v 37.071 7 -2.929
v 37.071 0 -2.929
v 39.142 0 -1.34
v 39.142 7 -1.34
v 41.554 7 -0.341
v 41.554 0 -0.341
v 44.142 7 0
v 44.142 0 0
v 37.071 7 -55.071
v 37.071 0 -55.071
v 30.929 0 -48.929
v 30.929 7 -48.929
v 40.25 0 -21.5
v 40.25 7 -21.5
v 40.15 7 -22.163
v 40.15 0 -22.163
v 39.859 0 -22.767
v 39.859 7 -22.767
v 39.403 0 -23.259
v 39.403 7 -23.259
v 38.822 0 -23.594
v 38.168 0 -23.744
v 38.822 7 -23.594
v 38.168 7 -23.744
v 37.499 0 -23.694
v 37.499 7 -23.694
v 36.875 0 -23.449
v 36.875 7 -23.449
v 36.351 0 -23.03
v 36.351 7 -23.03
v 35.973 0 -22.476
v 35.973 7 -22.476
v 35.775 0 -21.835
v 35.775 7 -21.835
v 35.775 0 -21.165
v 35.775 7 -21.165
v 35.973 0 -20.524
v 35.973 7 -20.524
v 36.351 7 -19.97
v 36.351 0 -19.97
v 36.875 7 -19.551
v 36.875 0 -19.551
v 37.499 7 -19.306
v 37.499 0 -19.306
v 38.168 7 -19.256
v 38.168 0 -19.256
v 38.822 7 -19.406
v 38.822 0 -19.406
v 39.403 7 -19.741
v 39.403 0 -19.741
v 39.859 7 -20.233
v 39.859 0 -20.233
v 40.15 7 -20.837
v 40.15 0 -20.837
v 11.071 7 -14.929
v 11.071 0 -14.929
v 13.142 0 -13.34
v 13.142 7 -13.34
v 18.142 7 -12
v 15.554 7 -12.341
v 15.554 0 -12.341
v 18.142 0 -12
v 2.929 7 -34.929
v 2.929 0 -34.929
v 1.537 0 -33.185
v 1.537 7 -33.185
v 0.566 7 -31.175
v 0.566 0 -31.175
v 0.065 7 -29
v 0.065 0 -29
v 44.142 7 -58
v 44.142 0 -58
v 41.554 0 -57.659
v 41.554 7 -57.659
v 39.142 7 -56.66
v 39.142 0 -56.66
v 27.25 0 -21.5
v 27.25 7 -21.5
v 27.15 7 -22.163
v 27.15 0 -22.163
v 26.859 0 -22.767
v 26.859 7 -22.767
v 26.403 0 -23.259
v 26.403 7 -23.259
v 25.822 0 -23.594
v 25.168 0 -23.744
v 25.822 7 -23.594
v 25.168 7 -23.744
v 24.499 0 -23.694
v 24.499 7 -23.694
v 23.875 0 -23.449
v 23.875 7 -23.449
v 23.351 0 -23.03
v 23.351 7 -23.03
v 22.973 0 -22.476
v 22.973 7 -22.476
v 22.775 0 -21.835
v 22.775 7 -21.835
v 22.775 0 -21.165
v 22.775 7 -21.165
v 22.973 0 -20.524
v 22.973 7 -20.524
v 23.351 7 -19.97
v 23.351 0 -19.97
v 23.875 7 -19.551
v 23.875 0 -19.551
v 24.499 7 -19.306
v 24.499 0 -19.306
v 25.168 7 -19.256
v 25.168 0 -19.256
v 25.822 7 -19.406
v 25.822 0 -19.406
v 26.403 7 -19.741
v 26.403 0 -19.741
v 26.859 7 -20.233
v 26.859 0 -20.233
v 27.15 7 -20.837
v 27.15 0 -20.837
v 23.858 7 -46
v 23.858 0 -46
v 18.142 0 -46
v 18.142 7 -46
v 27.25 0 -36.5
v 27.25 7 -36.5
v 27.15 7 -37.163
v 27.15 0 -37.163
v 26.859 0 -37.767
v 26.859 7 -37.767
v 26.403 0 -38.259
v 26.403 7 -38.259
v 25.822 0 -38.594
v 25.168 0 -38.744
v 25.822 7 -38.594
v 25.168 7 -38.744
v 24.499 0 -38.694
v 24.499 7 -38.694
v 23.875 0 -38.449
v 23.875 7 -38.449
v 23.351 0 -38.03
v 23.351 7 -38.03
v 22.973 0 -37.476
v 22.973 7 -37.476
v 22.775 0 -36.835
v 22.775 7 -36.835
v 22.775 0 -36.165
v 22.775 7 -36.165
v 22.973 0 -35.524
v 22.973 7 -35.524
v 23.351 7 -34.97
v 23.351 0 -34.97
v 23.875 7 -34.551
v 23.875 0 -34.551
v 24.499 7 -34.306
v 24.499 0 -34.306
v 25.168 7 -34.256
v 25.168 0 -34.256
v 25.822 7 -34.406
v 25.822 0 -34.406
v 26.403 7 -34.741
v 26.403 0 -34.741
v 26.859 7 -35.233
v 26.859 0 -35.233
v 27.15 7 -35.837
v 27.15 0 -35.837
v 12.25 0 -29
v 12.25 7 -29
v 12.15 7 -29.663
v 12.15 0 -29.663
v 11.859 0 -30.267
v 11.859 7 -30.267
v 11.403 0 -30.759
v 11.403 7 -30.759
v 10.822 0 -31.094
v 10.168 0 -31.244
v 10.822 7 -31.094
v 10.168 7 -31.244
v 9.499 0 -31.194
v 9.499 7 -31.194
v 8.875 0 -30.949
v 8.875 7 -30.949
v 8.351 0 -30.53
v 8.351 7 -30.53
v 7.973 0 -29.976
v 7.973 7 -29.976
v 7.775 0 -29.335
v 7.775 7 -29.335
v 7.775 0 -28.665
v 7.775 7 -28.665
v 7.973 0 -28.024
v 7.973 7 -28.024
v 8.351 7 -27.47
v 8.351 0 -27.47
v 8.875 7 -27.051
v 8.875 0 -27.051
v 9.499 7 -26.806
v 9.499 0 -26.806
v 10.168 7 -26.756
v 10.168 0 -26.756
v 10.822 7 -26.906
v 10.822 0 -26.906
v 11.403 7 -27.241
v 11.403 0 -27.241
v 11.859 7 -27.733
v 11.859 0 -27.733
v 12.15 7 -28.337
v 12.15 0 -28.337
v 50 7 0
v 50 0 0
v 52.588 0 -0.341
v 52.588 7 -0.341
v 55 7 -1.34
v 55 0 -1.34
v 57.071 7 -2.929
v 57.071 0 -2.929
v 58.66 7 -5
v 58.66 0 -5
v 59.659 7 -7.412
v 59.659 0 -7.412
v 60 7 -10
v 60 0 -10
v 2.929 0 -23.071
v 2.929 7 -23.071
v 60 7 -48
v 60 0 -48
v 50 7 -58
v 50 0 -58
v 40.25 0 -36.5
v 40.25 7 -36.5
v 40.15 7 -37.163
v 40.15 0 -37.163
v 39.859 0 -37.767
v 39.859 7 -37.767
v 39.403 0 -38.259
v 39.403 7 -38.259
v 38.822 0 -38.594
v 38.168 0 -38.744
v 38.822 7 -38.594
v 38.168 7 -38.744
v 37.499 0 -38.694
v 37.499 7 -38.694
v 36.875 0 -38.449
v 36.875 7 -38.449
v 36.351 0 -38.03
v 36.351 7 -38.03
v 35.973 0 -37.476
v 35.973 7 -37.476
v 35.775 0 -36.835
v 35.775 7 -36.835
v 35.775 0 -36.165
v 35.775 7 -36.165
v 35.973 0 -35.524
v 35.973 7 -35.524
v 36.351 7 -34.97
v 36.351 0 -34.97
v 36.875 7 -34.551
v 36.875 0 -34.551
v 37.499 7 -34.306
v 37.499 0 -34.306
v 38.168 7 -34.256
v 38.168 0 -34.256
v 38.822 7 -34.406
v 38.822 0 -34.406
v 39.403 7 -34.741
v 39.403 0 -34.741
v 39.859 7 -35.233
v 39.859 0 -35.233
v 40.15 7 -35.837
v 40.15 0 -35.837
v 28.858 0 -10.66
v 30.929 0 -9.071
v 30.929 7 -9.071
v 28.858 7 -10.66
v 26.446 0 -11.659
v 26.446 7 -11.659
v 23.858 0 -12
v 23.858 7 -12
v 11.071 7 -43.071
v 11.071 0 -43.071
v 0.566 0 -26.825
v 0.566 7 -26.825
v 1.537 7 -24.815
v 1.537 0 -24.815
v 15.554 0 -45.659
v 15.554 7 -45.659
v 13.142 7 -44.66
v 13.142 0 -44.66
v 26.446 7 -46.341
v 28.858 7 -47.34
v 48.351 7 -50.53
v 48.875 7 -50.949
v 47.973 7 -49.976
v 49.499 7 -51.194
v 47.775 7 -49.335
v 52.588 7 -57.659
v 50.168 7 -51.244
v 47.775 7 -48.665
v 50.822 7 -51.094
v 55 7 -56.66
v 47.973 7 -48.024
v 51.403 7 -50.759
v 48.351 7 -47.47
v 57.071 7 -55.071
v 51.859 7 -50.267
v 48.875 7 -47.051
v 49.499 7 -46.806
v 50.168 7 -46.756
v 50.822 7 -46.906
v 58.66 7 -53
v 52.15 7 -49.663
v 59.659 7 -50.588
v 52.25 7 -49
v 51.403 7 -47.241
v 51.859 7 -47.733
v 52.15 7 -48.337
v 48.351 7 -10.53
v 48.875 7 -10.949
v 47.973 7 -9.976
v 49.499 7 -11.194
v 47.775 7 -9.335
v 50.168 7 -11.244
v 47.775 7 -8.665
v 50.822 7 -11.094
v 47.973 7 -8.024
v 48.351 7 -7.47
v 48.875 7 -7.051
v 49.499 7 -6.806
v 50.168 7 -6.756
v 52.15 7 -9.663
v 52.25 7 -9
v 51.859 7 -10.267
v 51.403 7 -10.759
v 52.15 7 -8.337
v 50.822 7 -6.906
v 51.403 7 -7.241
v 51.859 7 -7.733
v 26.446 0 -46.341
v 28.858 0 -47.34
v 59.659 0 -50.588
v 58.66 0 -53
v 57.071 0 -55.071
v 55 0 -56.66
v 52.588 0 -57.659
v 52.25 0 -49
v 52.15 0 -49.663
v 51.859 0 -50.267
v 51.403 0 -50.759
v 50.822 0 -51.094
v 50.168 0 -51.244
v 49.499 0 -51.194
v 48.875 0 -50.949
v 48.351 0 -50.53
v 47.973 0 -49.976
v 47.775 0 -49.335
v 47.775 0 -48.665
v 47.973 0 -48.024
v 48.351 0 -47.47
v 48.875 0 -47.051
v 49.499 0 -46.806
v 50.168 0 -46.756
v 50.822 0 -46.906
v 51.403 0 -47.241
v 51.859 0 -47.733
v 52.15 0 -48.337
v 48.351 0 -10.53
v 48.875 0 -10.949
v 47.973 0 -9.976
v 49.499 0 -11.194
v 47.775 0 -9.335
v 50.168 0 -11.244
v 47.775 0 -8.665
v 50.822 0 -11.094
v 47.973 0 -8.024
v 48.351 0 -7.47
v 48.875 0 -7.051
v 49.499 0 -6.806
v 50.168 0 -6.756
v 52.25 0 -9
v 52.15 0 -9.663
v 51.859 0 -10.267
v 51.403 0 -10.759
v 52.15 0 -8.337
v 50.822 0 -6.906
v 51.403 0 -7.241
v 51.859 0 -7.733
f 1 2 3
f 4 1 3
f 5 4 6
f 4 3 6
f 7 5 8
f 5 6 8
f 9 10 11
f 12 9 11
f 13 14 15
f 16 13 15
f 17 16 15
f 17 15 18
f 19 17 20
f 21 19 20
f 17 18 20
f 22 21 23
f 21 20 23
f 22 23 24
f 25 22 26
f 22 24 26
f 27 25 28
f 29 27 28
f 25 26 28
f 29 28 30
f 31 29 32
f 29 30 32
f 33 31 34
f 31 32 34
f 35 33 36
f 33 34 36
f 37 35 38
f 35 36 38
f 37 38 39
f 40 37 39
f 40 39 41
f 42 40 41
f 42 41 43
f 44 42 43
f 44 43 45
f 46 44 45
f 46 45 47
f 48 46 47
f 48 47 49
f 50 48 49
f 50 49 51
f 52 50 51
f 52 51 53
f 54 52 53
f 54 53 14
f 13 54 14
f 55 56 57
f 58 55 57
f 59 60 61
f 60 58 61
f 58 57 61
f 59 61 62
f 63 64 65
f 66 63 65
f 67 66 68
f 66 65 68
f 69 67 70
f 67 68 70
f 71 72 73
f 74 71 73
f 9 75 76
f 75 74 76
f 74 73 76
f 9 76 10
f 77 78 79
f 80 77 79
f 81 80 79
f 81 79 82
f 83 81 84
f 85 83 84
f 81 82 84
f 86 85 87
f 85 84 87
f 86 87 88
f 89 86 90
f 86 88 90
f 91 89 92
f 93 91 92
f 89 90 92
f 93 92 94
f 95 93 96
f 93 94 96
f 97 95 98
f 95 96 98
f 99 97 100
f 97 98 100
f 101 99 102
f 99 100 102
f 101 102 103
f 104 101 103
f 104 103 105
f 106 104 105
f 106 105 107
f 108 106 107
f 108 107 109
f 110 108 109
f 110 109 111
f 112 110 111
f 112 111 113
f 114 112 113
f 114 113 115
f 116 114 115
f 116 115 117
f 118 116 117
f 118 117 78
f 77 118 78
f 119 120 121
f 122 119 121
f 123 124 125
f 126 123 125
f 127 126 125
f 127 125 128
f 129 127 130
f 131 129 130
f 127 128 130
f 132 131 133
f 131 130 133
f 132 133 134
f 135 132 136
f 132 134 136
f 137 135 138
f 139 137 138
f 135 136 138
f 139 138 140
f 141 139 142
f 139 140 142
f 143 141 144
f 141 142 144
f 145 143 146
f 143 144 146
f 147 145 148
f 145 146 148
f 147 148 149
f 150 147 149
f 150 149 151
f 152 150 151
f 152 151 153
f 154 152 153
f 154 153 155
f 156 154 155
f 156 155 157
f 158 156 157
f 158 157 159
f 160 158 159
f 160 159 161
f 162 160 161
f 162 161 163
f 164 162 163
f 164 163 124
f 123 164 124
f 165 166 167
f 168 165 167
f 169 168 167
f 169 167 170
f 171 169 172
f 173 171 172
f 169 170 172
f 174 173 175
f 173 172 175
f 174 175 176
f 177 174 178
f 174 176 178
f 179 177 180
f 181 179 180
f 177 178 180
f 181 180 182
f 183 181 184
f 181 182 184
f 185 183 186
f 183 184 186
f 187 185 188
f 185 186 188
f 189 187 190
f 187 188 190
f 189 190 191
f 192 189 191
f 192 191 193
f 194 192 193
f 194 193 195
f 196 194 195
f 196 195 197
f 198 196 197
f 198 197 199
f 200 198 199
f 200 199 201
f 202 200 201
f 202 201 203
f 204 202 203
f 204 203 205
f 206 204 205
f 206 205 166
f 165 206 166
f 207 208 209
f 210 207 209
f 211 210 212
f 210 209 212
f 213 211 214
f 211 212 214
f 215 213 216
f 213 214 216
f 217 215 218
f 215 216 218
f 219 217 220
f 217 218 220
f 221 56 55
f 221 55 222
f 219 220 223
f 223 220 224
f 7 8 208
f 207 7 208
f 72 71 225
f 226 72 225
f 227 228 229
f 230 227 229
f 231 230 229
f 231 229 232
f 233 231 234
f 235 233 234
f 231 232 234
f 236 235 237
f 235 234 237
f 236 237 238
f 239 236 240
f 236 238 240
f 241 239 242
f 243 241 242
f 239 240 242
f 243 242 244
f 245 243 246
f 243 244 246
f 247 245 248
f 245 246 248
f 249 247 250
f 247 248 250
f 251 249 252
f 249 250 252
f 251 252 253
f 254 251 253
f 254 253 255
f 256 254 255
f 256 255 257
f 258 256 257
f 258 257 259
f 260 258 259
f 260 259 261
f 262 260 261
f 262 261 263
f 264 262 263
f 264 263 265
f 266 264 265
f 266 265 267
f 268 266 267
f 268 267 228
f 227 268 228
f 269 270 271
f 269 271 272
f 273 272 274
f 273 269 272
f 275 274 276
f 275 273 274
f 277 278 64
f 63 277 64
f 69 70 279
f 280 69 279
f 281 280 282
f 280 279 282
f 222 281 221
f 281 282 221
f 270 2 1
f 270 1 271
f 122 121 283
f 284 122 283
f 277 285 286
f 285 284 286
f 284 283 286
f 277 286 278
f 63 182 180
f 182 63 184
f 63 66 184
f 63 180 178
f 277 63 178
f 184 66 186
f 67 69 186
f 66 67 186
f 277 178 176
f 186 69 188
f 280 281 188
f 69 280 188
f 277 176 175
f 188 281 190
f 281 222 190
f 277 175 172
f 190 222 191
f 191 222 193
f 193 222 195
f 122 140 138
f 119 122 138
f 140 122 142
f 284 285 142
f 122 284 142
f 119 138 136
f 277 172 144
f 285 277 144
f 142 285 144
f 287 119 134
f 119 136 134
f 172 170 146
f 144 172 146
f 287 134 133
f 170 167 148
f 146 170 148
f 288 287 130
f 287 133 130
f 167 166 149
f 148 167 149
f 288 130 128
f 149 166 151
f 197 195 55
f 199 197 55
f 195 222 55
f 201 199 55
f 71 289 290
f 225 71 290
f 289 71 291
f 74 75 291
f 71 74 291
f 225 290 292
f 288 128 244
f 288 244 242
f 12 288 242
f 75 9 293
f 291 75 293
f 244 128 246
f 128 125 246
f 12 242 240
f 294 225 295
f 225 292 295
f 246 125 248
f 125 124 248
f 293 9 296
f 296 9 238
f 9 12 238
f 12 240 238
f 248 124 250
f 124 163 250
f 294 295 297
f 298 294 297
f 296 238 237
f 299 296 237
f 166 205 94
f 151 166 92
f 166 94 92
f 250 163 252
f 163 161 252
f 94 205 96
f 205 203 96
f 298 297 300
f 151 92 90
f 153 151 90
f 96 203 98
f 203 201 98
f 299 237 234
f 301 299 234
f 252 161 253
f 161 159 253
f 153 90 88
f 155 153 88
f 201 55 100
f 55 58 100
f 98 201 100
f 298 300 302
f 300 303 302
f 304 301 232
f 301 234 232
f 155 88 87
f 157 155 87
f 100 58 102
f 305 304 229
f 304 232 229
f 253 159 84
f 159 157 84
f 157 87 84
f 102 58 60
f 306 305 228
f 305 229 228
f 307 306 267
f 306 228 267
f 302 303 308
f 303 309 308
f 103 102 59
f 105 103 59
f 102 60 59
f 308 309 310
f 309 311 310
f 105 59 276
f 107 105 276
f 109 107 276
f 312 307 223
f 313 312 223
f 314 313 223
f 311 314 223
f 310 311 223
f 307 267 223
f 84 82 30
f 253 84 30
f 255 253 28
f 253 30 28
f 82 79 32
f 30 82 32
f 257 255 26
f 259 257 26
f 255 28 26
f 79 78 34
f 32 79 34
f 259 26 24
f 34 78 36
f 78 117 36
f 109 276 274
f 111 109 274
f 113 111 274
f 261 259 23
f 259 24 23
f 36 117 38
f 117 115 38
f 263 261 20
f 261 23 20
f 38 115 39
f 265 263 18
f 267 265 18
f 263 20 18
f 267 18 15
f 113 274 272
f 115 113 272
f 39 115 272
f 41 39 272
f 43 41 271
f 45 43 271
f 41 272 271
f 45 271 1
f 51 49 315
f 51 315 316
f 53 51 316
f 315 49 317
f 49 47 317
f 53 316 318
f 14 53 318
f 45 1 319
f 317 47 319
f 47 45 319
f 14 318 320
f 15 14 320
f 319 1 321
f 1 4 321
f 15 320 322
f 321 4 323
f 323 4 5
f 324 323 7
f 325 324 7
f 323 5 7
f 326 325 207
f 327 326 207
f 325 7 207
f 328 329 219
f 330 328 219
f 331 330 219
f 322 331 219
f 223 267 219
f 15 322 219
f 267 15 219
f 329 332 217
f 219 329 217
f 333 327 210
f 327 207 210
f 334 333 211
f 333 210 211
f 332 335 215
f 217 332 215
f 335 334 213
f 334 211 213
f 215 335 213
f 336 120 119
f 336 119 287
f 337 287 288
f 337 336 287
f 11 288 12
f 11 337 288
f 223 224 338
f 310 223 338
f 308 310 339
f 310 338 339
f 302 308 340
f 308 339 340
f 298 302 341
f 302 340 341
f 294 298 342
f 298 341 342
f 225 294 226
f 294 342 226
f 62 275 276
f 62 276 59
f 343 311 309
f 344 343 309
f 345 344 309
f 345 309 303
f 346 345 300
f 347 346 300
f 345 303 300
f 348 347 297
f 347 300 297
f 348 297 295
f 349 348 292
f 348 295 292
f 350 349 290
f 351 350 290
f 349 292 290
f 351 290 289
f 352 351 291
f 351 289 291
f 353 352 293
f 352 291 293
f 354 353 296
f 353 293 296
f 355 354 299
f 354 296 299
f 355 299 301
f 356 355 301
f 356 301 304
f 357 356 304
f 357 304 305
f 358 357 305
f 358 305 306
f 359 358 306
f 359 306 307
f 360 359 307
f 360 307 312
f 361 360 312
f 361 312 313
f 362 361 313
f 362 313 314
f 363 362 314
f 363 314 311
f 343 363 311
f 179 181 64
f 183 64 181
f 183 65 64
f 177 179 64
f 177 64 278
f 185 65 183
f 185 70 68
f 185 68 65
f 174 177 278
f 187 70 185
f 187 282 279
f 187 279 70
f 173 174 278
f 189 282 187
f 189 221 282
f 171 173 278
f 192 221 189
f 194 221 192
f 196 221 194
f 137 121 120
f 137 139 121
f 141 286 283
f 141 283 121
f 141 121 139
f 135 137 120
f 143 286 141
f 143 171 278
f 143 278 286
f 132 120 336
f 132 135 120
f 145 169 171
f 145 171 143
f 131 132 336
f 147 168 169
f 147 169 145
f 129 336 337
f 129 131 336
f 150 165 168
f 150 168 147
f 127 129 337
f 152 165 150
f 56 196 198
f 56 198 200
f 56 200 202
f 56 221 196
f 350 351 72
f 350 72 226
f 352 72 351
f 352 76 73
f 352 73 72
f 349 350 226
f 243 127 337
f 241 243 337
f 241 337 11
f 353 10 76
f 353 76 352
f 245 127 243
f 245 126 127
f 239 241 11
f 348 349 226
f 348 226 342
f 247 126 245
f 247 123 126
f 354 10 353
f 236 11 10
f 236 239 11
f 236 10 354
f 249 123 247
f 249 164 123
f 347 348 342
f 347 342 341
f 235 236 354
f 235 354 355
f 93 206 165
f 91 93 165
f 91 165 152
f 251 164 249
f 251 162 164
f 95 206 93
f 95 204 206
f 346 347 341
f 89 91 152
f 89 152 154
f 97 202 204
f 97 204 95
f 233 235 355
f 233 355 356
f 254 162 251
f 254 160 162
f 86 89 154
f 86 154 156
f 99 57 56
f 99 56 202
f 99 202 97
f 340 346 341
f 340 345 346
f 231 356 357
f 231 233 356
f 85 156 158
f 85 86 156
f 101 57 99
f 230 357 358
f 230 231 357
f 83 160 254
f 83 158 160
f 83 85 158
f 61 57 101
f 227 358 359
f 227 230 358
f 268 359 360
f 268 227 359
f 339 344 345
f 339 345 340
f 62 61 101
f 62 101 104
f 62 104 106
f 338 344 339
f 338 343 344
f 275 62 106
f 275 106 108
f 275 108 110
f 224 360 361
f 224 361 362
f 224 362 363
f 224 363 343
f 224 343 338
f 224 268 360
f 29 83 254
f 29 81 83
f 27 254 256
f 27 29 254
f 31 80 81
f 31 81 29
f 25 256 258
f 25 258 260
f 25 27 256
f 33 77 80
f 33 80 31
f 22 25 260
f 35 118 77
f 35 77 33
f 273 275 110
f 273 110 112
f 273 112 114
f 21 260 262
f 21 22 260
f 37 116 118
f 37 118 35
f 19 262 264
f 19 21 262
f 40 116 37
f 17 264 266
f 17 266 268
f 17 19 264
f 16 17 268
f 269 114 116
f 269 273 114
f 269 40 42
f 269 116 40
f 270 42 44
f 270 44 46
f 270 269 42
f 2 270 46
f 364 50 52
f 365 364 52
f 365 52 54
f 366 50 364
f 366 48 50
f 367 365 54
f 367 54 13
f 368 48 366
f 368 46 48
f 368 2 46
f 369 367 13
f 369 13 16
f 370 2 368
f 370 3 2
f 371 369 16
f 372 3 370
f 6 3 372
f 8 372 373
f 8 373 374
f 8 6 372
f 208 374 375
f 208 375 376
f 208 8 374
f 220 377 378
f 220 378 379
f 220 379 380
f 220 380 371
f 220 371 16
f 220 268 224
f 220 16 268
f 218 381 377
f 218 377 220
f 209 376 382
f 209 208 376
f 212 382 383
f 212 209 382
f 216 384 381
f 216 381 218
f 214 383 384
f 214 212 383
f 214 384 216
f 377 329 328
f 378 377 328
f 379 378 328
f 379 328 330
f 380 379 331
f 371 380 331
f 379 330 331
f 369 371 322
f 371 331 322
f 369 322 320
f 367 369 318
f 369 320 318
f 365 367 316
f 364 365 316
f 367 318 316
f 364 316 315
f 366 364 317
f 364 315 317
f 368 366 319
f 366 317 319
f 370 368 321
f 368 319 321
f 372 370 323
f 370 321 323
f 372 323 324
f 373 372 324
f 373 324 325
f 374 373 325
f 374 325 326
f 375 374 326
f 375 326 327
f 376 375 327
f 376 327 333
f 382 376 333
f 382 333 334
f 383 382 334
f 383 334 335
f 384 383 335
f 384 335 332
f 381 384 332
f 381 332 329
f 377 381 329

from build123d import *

# Parameters (mm, degrees)
SKETCH1_W            = 60
SKETCH1_H            = 58
BOSS_EXTRUDE1_DEPTH  = 7
M4_CLEARANCE_HOLE2_D = 4.5
LPATTERN1_COUNT      = 2
LPATTERN1_PITCH      = 13
M4_CLEARANCE_HOLE4_D = 4.5
CUT_EXTRUDE5_DEPTH   = 84.743656476
FILLET3_R            = 10


with BuildPart() as part:
    # Sketch1 → Boss-Extrude1 (new body)
    with BuildSketch(Plane(origin=(0, 0, 0), x_dir=(1, 0, 0), z_dir=(0, 1, 0))):
        with Locations((30, 29)):
            Rectangle(SKETCH1_W, SKETCH1_H)
    extrude(amount=BOSS_EXTRUDE1_DEPTH)

    # M4 Clearance Hole2 (through all)
    with Locations(Plane(origin=(0, 0, 0), x_dir=(-1, 0, 0), z_dir=(0, -1, 0))):
        with Locations((-25, 36.5), (-25, 21.5)):
            m4_clearance_hole2 = Hole(M4_CLEARANCE_HOLE2_D / 2)

    # LPattern1: M4 Clearance Hole2 ×2
    with Locations(*[(i * LPATTERN1_PITCH, 0, 0) for i in range(1, LPATTERN1_COUNT)]):
        add(m4_clearance_hole2, mode=Mode.SUBTRACT)

    # M4 Clearance Hole4 (through all)
    with Locations(Plane(origin=(0, 0, 0), x_dir=(-1, 0, 0), z_dir=(0, -1, 0))):
        with Locations((-50, 49), (-50, 9), (-10, 29)):
            Hole(M4_CLEARANCE_HOLE4_D / 2)

    # Sketch29 → Cut-Extrude5 (cut, through all)
    with BuildSketch(Plane.XZ):
        Polygon((40, 0), (28, -12), (14, -12), (0, -26), (0, 0), align=None)
        Polygon((0, -32), (0, -58), (40, -58), (28, -46), (14, -46), align=None)
    extrude(amount=-CUT_EXTRUDE5_DEPTH, mode=Mode.SUBTRACT)

    # Fillet3
    # the kernel refuses this fillet: 10 mm, written as the material it adds along each edge
    with BuildSketch(Plane(origin=(28, 0, -46), x_dir=(-1, 0, 0), z_dir=(0, 1, 0)), Plane(origin=(28, 0, -12), x_dir=(0.7071067811865417, 0, 0.7071067811865532), z_dir=(0, 1, 0))) as fillet3_piece_1:
        with BuildLine():
            CenterArc((FILLET3_R * 0.414213562373, -FILLET3_R), FILLET3_R, 90, 45)
            Line((-FILLET3_R * 0.292893218813, -FILLET3_R * 0.292893218813), (0, 0))
            Line((0, 0), (FILLET3_R * 0.414213562373, 0))
        make_face()
    extrude(amount=7)
    # the kernel refuses this fillet: 10 mm, written as the material it takes off along each edge
    with BuildSketch(Plane(origin=(60, -25, 0), x_dir=(-1, 0, 0), z_dir=(0, 1, 0)), Plane(origin=(60, -25, -58), x_dir=(0, 0, 1), z_dir=(0, 1, 0))) as fillet3_2_piece_1:
        with BuildLine():
            CenterArc((FILLET3_R, -FILLET3_R), FILLET3_R, 90, 90)
            Line((0, -FILLET3_R), (0, 0))
            Line((0, 0), (FILLET3_R, 0))
        make_face()
    extrude(amount=57, mode=Mode.SUBTRACT)
    with BuildSketch(Plane(origin=(40, -10.355339059, -58), x_dir=(-0.7071067811865415, 0, 0.7071067811865536), z_dir=(0, 1, 0)), Plane(origin=(14, -10.355339059, -46), x_dir=(-0.7071067811865411, 0, 0.707106781186554), z_dir=(0, 1, 0)), Plane(origin=(0, -10.355339059, -32), x_dir=(0, 0, 1), z_dir=(0, 1, 0)), Plane(origin=(0, -10.355339059, -26), x_dir=(0.7071067811865417, 0, 0.7071067811865532), z_dir=(0, 1, 0)), Plane(origin=(14, -10.355339059, -12), x_dir=(1, 0, 0), z_dir=(0, 1, 0)), Plane(origin=(40, -10.355339059, 0), x_dir=(1, 0, 0), z_dir=(0, 1, 0))) as fillet3_2_piece_2:
        with BuildLine():
            CenterArc((FILLET3_R * 0.414213562373, FILLET3_R), FILLET3_R, 225, 45)
            Line((-FILLET3_R * 0.292893218813, FILLET3_R * 0.292893218813), (0, 0))
            Line((0, 0), (FILLET3_R * 0.414213562373, 0))
        make_face()
    extrude(amount=27.710678119, mode=Mode.SUBTRACT)


solid = part.part
